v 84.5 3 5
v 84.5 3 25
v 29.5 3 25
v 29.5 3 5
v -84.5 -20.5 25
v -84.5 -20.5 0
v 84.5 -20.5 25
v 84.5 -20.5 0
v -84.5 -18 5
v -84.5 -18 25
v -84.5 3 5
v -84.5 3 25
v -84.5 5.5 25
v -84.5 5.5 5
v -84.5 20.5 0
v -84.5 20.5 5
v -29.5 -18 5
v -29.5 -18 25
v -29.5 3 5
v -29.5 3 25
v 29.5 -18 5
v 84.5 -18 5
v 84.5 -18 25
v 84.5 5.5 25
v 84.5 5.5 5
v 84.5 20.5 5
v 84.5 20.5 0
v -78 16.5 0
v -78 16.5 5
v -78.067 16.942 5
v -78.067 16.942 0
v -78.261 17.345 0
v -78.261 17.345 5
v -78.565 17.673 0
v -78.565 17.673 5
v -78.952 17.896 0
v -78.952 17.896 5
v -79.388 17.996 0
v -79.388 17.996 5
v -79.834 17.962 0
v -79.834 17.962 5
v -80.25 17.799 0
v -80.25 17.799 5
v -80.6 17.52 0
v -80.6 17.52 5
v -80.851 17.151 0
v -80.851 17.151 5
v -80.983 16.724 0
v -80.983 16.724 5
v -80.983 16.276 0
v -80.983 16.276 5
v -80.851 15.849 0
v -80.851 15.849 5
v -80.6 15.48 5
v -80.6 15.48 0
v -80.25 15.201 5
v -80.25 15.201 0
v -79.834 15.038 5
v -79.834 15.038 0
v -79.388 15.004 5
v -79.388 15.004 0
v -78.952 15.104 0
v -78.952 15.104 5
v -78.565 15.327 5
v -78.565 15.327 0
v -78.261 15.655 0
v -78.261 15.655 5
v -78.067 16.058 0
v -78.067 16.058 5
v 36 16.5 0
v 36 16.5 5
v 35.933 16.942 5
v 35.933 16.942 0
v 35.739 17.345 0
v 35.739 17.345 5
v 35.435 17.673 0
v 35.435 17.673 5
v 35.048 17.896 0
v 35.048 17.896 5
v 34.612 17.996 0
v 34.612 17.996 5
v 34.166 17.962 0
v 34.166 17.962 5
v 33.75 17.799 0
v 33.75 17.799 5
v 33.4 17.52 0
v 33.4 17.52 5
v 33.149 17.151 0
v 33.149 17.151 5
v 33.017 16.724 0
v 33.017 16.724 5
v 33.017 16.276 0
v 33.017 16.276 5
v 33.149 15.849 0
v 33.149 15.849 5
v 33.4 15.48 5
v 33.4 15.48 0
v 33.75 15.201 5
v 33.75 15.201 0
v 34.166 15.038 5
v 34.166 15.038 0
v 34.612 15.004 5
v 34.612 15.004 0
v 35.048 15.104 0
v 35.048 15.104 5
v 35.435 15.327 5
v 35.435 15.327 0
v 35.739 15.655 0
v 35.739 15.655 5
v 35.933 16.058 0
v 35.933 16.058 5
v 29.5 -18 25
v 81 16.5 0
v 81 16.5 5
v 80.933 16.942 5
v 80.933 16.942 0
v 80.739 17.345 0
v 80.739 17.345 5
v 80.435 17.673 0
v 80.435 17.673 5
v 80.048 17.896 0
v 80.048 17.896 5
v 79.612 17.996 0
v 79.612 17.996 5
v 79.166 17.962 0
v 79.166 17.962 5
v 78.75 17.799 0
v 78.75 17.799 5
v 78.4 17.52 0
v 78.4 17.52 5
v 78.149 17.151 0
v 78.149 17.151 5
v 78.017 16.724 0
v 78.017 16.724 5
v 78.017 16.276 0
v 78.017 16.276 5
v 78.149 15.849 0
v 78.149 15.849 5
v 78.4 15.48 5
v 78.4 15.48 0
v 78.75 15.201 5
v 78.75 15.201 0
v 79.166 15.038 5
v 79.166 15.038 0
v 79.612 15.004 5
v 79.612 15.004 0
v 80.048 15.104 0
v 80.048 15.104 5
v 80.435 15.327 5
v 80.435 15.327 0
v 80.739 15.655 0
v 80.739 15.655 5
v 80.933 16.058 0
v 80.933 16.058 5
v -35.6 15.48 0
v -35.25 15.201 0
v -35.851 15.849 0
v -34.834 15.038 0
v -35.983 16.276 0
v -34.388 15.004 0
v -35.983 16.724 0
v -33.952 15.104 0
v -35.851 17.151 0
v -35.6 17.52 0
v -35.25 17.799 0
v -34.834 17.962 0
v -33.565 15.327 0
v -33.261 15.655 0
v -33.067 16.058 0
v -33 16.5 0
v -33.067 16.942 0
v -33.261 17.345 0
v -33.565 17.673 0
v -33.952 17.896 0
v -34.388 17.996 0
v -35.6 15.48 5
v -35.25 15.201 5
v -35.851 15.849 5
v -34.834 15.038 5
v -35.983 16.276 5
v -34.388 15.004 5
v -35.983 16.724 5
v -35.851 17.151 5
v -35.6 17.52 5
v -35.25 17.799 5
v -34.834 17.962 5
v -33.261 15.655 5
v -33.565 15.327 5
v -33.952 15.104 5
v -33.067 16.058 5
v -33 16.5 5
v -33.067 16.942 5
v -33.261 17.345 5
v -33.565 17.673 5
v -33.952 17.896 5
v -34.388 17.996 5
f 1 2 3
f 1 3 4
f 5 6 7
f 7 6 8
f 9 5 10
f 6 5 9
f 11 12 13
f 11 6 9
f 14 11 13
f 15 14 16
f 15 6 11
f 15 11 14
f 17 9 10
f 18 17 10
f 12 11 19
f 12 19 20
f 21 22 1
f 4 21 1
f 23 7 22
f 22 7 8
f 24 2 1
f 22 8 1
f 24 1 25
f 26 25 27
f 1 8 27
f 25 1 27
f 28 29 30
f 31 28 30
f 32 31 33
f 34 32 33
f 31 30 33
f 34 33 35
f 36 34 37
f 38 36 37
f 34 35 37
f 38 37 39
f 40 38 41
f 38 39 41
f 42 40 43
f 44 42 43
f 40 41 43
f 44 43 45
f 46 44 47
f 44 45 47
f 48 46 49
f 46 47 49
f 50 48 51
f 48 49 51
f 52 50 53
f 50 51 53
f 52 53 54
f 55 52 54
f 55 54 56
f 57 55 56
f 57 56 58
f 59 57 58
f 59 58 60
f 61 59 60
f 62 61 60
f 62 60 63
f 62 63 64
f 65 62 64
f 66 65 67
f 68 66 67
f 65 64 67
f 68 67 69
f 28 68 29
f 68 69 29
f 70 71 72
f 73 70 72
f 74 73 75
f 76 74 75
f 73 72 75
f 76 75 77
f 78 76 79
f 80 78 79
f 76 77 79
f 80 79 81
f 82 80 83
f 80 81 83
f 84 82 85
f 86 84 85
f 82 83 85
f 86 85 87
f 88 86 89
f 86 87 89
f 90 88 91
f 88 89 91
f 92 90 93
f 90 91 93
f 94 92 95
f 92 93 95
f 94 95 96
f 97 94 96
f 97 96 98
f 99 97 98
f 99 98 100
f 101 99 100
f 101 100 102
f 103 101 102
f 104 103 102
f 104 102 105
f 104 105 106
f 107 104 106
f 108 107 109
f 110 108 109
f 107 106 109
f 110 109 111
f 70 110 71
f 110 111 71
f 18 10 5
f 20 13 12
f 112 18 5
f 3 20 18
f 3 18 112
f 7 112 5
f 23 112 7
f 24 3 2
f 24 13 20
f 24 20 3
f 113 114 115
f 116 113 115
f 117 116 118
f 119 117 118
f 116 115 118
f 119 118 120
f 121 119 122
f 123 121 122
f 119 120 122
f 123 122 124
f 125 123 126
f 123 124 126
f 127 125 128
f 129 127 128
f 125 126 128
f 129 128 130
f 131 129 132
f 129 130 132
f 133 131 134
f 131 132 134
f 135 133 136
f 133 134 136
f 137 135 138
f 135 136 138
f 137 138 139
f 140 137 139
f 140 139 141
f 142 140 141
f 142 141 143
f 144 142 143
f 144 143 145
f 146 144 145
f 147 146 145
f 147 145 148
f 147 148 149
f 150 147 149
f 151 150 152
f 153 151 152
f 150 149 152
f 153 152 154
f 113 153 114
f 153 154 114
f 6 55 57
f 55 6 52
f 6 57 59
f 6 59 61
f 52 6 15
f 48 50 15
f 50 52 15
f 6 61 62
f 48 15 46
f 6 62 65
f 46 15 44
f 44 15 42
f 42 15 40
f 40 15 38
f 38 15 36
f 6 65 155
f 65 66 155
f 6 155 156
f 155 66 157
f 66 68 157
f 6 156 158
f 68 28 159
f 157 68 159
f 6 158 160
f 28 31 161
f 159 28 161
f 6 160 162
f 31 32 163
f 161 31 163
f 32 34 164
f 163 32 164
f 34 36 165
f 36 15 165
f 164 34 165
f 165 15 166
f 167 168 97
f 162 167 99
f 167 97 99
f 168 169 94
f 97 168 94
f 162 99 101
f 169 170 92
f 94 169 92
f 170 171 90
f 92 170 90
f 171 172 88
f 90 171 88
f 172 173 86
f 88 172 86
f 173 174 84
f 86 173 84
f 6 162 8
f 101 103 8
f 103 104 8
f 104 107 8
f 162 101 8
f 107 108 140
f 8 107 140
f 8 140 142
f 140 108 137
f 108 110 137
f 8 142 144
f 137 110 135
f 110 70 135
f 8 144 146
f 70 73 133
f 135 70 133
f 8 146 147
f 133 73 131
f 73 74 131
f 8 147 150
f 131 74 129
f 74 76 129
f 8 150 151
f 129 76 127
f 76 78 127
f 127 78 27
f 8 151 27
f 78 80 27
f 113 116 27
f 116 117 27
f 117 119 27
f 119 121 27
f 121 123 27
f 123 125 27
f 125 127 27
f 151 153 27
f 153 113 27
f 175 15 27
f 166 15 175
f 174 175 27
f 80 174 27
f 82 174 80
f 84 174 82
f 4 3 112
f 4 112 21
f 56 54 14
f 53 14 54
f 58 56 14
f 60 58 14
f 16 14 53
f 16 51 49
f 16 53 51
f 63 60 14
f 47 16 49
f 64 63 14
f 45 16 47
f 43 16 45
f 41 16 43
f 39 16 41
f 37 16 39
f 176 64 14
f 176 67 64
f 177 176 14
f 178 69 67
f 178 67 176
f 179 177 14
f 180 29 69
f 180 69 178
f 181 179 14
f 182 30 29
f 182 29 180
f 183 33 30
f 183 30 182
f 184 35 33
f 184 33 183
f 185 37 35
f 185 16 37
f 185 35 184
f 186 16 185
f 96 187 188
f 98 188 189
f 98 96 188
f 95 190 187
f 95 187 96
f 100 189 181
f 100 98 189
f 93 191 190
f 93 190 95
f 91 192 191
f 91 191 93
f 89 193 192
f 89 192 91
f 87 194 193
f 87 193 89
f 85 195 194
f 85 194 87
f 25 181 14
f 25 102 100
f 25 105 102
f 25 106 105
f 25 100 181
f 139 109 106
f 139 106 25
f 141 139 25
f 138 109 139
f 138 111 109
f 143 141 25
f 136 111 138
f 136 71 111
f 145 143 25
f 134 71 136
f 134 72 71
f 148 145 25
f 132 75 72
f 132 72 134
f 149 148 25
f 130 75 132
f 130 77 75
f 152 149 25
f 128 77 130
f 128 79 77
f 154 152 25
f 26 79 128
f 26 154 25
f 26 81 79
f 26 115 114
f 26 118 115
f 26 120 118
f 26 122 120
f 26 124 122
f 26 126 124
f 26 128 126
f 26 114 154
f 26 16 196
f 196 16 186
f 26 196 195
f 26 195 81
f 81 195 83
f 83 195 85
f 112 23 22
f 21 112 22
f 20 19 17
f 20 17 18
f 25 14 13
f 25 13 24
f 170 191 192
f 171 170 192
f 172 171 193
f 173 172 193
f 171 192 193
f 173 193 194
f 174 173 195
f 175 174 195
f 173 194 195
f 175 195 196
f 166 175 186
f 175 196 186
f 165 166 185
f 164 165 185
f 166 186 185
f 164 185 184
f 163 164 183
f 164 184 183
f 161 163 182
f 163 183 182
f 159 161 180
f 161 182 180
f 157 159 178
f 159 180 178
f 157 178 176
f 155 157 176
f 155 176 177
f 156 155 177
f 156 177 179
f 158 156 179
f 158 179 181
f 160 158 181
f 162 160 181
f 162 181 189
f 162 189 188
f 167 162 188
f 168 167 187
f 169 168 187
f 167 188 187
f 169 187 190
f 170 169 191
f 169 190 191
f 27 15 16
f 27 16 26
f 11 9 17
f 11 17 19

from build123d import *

# Parameters (mm, degrees)
SKETCH_1_W          = 169
SKETCH_1_H          = 41
EXTRUDE_2_DEPTH     = 5
SKETCH_3_R          = 1.5
CUT_EXTRUDE_1_DEPTH = 5
SKETCH_4_W          = 169
SKETCH_4_H          = 26
EXTRUDE_3_DEPTH     = 20
SKETCH_5_W          = 20
SKETCH_5_H          = 21
CUT_EXTRUDE_2_DEPTH = 55
SKETCH_6_W          = 20
SKETCH_6_H          = 21
CUT_EXTRUDE_3_DEPTH = 55


with BuildPart() as part:
    # Эскиз1 → Бобышка-Вытянуть2 (new body)
    with BuildSketch(Plane.XY):
        Rectangle(SKETCH_1_W, SKETCH_1_H)
    extrude(amount=EXTRUDE_2_DEPTH)

    # Эскиз3 → Вырез-Вытянуть1 (cut)
    with BuildSketch(Plane.XY.offset(5)):
        with Locations((79.5, 16.5)):
            Circle(SKETCH_3_R)
        with Locations((34.5, 16.5)):
            Circle(SKETCH_3_R)
        with Locations((-34.5, 16.5)):
            Circle(SKETCH_3_R)
        with Locations((-79.5, 16.5)):
            Circle(SKETCH_3_R)
    extrude(amount=-CUT_EXTRUDE_1_DEPTH, mode=Mode.SUBTRACT)

    # Эскиз4 → Бобышка-Вытянуть3 (add)
    with BuildSketch(Plane.XY.offset(5)):
        with Locations((0, -7.5)):
            Rectangle(SKETCH_4_W, SKETCH_4_H)
    extrude(amount=EXTRUDE_3_DEPTH)

    # Эскиз5 → Вырез-Вытянуть2 (cut)
    with BuildSketch(Plane.ZY.offset(84.5)):
        with Locations((15, -7.5)):
            Rectangle(SKETCH_5_W, SKETCH_5_H)
    extrude(amount=-CUT_EXTRUDE_2_DEPTH, mode=Mode.SUBTRACT)

    # Эскиз6 → Вырез-Вытянуть3 (cut)
    with BuildSketch(Plane(origin=(84.5, 0, 0), x_dir=(0, 0, -1), z_dir=(1, 0, 0))):
        with Locations((-15, -7.5)):
            Rectangle(SKETCH_6_W, SKETCH_6_H)
    extrude(amount=-CUT_EXTRUDE_3_DEPTH, mode=Mode.SUBTRACT)


solid = part.part
